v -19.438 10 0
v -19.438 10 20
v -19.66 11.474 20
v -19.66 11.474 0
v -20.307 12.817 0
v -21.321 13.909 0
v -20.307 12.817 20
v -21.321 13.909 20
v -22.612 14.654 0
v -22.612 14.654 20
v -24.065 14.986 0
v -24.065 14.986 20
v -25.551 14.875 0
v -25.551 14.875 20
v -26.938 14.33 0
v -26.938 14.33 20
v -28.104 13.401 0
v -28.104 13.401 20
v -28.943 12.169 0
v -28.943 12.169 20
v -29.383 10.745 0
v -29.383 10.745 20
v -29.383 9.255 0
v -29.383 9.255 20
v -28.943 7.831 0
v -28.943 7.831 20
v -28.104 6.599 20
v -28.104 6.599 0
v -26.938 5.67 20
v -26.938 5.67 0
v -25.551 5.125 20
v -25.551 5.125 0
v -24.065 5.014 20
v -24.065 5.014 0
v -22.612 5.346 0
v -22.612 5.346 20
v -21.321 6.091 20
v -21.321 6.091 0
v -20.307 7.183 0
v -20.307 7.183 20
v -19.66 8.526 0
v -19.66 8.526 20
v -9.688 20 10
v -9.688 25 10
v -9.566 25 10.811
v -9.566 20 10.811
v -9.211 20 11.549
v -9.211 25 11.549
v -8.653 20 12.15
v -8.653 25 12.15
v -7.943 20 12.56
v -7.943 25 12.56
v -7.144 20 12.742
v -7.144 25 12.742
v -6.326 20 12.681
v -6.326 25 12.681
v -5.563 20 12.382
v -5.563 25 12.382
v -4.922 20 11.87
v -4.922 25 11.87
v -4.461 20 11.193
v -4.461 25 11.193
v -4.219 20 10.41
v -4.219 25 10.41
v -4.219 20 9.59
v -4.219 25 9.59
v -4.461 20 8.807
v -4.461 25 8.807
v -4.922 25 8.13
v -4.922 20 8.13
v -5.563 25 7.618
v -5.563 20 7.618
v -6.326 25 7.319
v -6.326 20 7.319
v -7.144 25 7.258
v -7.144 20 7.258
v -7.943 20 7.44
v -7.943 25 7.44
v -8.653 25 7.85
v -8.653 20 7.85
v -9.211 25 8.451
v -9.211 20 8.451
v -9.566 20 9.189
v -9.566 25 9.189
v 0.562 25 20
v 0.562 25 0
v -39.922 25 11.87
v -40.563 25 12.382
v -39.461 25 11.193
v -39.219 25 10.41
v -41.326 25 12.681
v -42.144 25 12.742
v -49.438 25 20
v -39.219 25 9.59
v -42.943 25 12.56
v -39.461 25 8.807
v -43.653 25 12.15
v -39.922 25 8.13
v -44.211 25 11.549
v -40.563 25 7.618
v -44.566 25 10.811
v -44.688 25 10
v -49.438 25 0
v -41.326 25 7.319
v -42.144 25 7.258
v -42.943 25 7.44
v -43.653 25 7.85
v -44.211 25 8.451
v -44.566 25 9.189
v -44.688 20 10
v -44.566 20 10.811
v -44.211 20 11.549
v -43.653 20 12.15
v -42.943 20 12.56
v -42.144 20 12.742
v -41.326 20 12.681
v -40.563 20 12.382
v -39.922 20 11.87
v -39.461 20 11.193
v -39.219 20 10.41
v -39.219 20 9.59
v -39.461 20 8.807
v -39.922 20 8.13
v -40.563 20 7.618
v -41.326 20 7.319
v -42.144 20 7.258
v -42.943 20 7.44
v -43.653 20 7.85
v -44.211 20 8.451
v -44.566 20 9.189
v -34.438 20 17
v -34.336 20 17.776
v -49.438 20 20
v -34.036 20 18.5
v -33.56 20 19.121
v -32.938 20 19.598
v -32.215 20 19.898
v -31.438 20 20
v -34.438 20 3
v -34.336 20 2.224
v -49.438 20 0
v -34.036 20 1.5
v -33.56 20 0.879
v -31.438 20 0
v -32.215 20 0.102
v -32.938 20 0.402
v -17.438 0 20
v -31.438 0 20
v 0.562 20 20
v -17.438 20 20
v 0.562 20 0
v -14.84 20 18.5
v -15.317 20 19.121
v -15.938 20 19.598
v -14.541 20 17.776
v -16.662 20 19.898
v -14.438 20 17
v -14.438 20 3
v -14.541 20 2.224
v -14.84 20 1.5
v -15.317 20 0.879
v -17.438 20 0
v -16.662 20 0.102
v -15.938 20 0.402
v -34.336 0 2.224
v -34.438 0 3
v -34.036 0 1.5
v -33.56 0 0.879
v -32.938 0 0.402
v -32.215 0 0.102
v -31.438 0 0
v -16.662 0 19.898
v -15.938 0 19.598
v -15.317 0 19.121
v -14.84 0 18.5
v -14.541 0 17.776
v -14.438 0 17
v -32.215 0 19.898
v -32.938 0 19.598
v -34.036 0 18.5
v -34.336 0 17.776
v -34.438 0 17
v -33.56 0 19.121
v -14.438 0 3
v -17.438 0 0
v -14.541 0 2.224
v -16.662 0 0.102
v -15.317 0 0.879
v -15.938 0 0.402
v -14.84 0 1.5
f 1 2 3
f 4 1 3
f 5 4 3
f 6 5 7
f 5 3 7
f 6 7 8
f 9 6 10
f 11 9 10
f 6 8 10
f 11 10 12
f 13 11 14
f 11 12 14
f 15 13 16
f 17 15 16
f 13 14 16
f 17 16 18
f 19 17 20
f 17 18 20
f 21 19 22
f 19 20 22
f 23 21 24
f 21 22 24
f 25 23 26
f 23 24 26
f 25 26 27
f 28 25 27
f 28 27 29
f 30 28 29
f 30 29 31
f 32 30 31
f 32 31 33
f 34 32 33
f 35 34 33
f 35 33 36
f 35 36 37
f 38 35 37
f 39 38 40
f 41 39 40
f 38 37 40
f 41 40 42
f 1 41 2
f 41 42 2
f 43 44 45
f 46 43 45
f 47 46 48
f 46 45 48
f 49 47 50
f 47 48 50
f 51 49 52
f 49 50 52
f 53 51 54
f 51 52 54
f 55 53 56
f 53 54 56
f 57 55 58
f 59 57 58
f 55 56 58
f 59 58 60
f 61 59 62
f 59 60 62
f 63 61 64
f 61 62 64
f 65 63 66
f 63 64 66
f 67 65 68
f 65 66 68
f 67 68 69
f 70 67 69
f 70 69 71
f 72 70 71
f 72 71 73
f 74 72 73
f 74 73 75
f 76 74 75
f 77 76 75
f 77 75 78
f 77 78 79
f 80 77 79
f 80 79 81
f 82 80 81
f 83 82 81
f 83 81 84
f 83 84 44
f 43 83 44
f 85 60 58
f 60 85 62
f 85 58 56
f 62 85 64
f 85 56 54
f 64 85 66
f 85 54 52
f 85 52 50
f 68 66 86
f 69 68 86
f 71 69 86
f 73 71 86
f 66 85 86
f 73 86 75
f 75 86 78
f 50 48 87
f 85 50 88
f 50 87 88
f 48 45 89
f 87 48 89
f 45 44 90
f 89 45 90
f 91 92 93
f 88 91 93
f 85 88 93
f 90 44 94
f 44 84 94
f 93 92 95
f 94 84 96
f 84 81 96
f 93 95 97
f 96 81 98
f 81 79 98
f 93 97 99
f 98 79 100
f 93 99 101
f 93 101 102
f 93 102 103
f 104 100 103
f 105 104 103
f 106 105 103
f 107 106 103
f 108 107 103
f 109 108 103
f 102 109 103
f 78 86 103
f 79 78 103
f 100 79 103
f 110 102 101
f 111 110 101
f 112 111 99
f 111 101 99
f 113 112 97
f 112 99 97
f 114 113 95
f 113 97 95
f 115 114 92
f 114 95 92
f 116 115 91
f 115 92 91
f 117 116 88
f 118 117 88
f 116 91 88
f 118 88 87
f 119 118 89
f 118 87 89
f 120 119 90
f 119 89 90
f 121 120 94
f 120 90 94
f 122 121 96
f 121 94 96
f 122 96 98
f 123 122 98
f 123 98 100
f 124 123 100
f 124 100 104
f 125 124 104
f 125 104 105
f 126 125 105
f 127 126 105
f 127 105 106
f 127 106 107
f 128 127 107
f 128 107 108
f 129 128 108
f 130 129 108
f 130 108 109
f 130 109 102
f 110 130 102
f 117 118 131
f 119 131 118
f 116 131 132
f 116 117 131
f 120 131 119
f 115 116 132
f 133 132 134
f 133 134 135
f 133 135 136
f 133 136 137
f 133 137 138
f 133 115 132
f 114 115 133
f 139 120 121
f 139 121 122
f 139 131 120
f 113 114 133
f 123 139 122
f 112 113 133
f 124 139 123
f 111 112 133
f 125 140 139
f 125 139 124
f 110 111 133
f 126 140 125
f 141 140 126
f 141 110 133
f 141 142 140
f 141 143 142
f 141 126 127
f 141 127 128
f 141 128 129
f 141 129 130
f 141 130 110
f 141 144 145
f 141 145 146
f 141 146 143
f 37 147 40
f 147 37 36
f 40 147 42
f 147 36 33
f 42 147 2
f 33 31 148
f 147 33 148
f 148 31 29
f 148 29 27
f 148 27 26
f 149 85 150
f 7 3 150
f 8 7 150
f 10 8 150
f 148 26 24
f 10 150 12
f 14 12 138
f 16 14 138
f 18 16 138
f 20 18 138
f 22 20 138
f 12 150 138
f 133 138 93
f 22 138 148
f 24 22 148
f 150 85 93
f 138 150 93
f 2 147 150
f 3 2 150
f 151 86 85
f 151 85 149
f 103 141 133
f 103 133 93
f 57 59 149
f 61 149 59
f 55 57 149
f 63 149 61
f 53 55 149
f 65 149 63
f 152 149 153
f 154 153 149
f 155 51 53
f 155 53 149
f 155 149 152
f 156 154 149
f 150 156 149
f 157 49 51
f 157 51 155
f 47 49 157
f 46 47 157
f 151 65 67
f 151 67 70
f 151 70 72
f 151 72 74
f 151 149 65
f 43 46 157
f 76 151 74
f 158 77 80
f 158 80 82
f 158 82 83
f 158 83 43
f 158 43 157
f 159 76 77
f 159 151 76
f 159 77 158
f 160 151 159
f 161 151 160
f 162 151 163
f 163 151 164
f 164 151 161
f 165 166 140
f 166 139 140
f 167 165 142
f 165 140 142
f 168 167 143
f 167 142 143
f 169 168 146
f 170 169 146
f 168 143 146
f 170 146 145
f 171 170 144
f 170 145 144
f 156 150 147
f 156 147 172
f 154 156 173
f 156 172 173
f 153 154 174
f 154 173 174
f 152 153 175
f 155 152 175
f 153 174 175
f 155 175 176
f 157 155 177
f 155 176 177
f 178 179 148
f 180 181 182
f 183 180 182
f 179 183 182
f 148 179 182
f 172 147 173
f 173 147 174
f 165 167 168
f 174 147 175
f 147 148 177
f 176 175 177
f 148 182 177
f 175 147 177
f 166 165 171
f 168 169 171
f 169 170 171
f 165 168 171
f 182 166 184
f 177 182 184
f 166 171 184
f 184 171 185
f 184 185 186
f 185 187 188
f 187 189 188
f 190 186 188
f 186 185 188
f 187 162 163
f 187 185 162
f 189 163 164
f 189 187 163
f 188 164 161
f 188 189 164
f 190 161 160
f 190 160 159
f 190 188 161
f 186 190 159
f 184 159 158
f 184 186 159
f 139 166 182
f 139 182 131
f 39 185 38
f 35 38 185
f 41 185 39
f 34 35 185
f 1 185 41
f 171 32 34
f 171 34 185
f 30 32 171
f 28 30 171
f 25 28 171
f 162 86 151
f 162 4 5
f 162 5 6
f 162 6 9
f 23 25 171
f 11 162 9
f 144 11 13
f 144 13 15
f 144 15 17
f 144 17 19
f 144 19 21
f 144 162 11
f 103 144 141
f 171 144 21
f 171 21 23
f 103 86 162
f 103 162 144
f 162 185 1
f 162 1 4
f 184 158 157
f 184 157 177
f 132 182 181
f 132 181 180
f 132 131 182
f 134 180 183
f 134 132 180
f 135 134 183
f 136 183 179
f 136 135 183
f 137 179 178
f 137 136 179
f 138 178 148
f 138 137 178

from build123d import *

# Parameters (mm, degrees)
AUFSATZ_LINEAR_AUSTRAGEN1_DEPTH = 20
SKIZZE2_R                       = 5
SCHNITT_LINEAR_AUSTRAGEN1_DEPTH = 20
SKIZZE3_R                       = 2.75
SCHNITT_LINEAR_AUSTRAGEN2_DEPTH = 20
VERRUNDUNG1_R                   = 3


with BuildPart() as part:
    # Skizze1 → Aufsatz-Linear austragen1 (new body)
    with BuildSketch(Plane.XY):
        Polygon((-34.43835366, 0), (-34.43835366, 20), (-49.43835366, 20), (-49.43835366, 25), (-24.43835366, 25), (0.56164634, 25), (0.56164634, 20), (-14.43835366, 20), (-14.43835366, 0), (-24.43835366, 0), align=None)
    extrude(amount=AUFSATZ_LINEAR_AUSTRAGEN1_DEPTH)

    # Skizze2 → Schnitt-Linear austragen1 (cut)
    with BuildSketch(Plane.XY.offset(20)):
        with Locations((-24.43835366, 10)):
            Circle(SKIZZE2_R)
    extrude(amount=-SCHNITT_LINEAR_AUSTRAGEN1_DEPTH, mode=Mode.SUBTRACT)

    # Skizze3 → Schnitt-Linear austragen2 (cut)
    with BuildSketch(Plane(origin=(0, 25, 0), x_dir=(1, 0, 0), z_dir=(0, 1, 0))):
        with Locations(Location((-41.93835366, -10, 0), (0, 0, 180))):
            Circle(SKIZZE3_R)
        with Locations(Location((-6.93835366, -10, 0), (0, 0, 180))):
            Circle(SKIZZE3_R)
    extrude(amount=-SCHNITT_LINEAR_AUSTRAGEN2_DEPTH, mode=Mode.SUBTRACT)

    # Verrundung1
    verrundung1_edges = [part.edges().sort_by_distance(p)[0] for p in [
        (-14.43835366, 10, 20),
        (-14.43835366, 10, 0),
        (-34.43835366, 10, 20),
        (-34.43835366, 10, 0),
    ]]
    fillet(verrundung1_edges, radius=VERRUNDUNG1_R)


solid = part.part
